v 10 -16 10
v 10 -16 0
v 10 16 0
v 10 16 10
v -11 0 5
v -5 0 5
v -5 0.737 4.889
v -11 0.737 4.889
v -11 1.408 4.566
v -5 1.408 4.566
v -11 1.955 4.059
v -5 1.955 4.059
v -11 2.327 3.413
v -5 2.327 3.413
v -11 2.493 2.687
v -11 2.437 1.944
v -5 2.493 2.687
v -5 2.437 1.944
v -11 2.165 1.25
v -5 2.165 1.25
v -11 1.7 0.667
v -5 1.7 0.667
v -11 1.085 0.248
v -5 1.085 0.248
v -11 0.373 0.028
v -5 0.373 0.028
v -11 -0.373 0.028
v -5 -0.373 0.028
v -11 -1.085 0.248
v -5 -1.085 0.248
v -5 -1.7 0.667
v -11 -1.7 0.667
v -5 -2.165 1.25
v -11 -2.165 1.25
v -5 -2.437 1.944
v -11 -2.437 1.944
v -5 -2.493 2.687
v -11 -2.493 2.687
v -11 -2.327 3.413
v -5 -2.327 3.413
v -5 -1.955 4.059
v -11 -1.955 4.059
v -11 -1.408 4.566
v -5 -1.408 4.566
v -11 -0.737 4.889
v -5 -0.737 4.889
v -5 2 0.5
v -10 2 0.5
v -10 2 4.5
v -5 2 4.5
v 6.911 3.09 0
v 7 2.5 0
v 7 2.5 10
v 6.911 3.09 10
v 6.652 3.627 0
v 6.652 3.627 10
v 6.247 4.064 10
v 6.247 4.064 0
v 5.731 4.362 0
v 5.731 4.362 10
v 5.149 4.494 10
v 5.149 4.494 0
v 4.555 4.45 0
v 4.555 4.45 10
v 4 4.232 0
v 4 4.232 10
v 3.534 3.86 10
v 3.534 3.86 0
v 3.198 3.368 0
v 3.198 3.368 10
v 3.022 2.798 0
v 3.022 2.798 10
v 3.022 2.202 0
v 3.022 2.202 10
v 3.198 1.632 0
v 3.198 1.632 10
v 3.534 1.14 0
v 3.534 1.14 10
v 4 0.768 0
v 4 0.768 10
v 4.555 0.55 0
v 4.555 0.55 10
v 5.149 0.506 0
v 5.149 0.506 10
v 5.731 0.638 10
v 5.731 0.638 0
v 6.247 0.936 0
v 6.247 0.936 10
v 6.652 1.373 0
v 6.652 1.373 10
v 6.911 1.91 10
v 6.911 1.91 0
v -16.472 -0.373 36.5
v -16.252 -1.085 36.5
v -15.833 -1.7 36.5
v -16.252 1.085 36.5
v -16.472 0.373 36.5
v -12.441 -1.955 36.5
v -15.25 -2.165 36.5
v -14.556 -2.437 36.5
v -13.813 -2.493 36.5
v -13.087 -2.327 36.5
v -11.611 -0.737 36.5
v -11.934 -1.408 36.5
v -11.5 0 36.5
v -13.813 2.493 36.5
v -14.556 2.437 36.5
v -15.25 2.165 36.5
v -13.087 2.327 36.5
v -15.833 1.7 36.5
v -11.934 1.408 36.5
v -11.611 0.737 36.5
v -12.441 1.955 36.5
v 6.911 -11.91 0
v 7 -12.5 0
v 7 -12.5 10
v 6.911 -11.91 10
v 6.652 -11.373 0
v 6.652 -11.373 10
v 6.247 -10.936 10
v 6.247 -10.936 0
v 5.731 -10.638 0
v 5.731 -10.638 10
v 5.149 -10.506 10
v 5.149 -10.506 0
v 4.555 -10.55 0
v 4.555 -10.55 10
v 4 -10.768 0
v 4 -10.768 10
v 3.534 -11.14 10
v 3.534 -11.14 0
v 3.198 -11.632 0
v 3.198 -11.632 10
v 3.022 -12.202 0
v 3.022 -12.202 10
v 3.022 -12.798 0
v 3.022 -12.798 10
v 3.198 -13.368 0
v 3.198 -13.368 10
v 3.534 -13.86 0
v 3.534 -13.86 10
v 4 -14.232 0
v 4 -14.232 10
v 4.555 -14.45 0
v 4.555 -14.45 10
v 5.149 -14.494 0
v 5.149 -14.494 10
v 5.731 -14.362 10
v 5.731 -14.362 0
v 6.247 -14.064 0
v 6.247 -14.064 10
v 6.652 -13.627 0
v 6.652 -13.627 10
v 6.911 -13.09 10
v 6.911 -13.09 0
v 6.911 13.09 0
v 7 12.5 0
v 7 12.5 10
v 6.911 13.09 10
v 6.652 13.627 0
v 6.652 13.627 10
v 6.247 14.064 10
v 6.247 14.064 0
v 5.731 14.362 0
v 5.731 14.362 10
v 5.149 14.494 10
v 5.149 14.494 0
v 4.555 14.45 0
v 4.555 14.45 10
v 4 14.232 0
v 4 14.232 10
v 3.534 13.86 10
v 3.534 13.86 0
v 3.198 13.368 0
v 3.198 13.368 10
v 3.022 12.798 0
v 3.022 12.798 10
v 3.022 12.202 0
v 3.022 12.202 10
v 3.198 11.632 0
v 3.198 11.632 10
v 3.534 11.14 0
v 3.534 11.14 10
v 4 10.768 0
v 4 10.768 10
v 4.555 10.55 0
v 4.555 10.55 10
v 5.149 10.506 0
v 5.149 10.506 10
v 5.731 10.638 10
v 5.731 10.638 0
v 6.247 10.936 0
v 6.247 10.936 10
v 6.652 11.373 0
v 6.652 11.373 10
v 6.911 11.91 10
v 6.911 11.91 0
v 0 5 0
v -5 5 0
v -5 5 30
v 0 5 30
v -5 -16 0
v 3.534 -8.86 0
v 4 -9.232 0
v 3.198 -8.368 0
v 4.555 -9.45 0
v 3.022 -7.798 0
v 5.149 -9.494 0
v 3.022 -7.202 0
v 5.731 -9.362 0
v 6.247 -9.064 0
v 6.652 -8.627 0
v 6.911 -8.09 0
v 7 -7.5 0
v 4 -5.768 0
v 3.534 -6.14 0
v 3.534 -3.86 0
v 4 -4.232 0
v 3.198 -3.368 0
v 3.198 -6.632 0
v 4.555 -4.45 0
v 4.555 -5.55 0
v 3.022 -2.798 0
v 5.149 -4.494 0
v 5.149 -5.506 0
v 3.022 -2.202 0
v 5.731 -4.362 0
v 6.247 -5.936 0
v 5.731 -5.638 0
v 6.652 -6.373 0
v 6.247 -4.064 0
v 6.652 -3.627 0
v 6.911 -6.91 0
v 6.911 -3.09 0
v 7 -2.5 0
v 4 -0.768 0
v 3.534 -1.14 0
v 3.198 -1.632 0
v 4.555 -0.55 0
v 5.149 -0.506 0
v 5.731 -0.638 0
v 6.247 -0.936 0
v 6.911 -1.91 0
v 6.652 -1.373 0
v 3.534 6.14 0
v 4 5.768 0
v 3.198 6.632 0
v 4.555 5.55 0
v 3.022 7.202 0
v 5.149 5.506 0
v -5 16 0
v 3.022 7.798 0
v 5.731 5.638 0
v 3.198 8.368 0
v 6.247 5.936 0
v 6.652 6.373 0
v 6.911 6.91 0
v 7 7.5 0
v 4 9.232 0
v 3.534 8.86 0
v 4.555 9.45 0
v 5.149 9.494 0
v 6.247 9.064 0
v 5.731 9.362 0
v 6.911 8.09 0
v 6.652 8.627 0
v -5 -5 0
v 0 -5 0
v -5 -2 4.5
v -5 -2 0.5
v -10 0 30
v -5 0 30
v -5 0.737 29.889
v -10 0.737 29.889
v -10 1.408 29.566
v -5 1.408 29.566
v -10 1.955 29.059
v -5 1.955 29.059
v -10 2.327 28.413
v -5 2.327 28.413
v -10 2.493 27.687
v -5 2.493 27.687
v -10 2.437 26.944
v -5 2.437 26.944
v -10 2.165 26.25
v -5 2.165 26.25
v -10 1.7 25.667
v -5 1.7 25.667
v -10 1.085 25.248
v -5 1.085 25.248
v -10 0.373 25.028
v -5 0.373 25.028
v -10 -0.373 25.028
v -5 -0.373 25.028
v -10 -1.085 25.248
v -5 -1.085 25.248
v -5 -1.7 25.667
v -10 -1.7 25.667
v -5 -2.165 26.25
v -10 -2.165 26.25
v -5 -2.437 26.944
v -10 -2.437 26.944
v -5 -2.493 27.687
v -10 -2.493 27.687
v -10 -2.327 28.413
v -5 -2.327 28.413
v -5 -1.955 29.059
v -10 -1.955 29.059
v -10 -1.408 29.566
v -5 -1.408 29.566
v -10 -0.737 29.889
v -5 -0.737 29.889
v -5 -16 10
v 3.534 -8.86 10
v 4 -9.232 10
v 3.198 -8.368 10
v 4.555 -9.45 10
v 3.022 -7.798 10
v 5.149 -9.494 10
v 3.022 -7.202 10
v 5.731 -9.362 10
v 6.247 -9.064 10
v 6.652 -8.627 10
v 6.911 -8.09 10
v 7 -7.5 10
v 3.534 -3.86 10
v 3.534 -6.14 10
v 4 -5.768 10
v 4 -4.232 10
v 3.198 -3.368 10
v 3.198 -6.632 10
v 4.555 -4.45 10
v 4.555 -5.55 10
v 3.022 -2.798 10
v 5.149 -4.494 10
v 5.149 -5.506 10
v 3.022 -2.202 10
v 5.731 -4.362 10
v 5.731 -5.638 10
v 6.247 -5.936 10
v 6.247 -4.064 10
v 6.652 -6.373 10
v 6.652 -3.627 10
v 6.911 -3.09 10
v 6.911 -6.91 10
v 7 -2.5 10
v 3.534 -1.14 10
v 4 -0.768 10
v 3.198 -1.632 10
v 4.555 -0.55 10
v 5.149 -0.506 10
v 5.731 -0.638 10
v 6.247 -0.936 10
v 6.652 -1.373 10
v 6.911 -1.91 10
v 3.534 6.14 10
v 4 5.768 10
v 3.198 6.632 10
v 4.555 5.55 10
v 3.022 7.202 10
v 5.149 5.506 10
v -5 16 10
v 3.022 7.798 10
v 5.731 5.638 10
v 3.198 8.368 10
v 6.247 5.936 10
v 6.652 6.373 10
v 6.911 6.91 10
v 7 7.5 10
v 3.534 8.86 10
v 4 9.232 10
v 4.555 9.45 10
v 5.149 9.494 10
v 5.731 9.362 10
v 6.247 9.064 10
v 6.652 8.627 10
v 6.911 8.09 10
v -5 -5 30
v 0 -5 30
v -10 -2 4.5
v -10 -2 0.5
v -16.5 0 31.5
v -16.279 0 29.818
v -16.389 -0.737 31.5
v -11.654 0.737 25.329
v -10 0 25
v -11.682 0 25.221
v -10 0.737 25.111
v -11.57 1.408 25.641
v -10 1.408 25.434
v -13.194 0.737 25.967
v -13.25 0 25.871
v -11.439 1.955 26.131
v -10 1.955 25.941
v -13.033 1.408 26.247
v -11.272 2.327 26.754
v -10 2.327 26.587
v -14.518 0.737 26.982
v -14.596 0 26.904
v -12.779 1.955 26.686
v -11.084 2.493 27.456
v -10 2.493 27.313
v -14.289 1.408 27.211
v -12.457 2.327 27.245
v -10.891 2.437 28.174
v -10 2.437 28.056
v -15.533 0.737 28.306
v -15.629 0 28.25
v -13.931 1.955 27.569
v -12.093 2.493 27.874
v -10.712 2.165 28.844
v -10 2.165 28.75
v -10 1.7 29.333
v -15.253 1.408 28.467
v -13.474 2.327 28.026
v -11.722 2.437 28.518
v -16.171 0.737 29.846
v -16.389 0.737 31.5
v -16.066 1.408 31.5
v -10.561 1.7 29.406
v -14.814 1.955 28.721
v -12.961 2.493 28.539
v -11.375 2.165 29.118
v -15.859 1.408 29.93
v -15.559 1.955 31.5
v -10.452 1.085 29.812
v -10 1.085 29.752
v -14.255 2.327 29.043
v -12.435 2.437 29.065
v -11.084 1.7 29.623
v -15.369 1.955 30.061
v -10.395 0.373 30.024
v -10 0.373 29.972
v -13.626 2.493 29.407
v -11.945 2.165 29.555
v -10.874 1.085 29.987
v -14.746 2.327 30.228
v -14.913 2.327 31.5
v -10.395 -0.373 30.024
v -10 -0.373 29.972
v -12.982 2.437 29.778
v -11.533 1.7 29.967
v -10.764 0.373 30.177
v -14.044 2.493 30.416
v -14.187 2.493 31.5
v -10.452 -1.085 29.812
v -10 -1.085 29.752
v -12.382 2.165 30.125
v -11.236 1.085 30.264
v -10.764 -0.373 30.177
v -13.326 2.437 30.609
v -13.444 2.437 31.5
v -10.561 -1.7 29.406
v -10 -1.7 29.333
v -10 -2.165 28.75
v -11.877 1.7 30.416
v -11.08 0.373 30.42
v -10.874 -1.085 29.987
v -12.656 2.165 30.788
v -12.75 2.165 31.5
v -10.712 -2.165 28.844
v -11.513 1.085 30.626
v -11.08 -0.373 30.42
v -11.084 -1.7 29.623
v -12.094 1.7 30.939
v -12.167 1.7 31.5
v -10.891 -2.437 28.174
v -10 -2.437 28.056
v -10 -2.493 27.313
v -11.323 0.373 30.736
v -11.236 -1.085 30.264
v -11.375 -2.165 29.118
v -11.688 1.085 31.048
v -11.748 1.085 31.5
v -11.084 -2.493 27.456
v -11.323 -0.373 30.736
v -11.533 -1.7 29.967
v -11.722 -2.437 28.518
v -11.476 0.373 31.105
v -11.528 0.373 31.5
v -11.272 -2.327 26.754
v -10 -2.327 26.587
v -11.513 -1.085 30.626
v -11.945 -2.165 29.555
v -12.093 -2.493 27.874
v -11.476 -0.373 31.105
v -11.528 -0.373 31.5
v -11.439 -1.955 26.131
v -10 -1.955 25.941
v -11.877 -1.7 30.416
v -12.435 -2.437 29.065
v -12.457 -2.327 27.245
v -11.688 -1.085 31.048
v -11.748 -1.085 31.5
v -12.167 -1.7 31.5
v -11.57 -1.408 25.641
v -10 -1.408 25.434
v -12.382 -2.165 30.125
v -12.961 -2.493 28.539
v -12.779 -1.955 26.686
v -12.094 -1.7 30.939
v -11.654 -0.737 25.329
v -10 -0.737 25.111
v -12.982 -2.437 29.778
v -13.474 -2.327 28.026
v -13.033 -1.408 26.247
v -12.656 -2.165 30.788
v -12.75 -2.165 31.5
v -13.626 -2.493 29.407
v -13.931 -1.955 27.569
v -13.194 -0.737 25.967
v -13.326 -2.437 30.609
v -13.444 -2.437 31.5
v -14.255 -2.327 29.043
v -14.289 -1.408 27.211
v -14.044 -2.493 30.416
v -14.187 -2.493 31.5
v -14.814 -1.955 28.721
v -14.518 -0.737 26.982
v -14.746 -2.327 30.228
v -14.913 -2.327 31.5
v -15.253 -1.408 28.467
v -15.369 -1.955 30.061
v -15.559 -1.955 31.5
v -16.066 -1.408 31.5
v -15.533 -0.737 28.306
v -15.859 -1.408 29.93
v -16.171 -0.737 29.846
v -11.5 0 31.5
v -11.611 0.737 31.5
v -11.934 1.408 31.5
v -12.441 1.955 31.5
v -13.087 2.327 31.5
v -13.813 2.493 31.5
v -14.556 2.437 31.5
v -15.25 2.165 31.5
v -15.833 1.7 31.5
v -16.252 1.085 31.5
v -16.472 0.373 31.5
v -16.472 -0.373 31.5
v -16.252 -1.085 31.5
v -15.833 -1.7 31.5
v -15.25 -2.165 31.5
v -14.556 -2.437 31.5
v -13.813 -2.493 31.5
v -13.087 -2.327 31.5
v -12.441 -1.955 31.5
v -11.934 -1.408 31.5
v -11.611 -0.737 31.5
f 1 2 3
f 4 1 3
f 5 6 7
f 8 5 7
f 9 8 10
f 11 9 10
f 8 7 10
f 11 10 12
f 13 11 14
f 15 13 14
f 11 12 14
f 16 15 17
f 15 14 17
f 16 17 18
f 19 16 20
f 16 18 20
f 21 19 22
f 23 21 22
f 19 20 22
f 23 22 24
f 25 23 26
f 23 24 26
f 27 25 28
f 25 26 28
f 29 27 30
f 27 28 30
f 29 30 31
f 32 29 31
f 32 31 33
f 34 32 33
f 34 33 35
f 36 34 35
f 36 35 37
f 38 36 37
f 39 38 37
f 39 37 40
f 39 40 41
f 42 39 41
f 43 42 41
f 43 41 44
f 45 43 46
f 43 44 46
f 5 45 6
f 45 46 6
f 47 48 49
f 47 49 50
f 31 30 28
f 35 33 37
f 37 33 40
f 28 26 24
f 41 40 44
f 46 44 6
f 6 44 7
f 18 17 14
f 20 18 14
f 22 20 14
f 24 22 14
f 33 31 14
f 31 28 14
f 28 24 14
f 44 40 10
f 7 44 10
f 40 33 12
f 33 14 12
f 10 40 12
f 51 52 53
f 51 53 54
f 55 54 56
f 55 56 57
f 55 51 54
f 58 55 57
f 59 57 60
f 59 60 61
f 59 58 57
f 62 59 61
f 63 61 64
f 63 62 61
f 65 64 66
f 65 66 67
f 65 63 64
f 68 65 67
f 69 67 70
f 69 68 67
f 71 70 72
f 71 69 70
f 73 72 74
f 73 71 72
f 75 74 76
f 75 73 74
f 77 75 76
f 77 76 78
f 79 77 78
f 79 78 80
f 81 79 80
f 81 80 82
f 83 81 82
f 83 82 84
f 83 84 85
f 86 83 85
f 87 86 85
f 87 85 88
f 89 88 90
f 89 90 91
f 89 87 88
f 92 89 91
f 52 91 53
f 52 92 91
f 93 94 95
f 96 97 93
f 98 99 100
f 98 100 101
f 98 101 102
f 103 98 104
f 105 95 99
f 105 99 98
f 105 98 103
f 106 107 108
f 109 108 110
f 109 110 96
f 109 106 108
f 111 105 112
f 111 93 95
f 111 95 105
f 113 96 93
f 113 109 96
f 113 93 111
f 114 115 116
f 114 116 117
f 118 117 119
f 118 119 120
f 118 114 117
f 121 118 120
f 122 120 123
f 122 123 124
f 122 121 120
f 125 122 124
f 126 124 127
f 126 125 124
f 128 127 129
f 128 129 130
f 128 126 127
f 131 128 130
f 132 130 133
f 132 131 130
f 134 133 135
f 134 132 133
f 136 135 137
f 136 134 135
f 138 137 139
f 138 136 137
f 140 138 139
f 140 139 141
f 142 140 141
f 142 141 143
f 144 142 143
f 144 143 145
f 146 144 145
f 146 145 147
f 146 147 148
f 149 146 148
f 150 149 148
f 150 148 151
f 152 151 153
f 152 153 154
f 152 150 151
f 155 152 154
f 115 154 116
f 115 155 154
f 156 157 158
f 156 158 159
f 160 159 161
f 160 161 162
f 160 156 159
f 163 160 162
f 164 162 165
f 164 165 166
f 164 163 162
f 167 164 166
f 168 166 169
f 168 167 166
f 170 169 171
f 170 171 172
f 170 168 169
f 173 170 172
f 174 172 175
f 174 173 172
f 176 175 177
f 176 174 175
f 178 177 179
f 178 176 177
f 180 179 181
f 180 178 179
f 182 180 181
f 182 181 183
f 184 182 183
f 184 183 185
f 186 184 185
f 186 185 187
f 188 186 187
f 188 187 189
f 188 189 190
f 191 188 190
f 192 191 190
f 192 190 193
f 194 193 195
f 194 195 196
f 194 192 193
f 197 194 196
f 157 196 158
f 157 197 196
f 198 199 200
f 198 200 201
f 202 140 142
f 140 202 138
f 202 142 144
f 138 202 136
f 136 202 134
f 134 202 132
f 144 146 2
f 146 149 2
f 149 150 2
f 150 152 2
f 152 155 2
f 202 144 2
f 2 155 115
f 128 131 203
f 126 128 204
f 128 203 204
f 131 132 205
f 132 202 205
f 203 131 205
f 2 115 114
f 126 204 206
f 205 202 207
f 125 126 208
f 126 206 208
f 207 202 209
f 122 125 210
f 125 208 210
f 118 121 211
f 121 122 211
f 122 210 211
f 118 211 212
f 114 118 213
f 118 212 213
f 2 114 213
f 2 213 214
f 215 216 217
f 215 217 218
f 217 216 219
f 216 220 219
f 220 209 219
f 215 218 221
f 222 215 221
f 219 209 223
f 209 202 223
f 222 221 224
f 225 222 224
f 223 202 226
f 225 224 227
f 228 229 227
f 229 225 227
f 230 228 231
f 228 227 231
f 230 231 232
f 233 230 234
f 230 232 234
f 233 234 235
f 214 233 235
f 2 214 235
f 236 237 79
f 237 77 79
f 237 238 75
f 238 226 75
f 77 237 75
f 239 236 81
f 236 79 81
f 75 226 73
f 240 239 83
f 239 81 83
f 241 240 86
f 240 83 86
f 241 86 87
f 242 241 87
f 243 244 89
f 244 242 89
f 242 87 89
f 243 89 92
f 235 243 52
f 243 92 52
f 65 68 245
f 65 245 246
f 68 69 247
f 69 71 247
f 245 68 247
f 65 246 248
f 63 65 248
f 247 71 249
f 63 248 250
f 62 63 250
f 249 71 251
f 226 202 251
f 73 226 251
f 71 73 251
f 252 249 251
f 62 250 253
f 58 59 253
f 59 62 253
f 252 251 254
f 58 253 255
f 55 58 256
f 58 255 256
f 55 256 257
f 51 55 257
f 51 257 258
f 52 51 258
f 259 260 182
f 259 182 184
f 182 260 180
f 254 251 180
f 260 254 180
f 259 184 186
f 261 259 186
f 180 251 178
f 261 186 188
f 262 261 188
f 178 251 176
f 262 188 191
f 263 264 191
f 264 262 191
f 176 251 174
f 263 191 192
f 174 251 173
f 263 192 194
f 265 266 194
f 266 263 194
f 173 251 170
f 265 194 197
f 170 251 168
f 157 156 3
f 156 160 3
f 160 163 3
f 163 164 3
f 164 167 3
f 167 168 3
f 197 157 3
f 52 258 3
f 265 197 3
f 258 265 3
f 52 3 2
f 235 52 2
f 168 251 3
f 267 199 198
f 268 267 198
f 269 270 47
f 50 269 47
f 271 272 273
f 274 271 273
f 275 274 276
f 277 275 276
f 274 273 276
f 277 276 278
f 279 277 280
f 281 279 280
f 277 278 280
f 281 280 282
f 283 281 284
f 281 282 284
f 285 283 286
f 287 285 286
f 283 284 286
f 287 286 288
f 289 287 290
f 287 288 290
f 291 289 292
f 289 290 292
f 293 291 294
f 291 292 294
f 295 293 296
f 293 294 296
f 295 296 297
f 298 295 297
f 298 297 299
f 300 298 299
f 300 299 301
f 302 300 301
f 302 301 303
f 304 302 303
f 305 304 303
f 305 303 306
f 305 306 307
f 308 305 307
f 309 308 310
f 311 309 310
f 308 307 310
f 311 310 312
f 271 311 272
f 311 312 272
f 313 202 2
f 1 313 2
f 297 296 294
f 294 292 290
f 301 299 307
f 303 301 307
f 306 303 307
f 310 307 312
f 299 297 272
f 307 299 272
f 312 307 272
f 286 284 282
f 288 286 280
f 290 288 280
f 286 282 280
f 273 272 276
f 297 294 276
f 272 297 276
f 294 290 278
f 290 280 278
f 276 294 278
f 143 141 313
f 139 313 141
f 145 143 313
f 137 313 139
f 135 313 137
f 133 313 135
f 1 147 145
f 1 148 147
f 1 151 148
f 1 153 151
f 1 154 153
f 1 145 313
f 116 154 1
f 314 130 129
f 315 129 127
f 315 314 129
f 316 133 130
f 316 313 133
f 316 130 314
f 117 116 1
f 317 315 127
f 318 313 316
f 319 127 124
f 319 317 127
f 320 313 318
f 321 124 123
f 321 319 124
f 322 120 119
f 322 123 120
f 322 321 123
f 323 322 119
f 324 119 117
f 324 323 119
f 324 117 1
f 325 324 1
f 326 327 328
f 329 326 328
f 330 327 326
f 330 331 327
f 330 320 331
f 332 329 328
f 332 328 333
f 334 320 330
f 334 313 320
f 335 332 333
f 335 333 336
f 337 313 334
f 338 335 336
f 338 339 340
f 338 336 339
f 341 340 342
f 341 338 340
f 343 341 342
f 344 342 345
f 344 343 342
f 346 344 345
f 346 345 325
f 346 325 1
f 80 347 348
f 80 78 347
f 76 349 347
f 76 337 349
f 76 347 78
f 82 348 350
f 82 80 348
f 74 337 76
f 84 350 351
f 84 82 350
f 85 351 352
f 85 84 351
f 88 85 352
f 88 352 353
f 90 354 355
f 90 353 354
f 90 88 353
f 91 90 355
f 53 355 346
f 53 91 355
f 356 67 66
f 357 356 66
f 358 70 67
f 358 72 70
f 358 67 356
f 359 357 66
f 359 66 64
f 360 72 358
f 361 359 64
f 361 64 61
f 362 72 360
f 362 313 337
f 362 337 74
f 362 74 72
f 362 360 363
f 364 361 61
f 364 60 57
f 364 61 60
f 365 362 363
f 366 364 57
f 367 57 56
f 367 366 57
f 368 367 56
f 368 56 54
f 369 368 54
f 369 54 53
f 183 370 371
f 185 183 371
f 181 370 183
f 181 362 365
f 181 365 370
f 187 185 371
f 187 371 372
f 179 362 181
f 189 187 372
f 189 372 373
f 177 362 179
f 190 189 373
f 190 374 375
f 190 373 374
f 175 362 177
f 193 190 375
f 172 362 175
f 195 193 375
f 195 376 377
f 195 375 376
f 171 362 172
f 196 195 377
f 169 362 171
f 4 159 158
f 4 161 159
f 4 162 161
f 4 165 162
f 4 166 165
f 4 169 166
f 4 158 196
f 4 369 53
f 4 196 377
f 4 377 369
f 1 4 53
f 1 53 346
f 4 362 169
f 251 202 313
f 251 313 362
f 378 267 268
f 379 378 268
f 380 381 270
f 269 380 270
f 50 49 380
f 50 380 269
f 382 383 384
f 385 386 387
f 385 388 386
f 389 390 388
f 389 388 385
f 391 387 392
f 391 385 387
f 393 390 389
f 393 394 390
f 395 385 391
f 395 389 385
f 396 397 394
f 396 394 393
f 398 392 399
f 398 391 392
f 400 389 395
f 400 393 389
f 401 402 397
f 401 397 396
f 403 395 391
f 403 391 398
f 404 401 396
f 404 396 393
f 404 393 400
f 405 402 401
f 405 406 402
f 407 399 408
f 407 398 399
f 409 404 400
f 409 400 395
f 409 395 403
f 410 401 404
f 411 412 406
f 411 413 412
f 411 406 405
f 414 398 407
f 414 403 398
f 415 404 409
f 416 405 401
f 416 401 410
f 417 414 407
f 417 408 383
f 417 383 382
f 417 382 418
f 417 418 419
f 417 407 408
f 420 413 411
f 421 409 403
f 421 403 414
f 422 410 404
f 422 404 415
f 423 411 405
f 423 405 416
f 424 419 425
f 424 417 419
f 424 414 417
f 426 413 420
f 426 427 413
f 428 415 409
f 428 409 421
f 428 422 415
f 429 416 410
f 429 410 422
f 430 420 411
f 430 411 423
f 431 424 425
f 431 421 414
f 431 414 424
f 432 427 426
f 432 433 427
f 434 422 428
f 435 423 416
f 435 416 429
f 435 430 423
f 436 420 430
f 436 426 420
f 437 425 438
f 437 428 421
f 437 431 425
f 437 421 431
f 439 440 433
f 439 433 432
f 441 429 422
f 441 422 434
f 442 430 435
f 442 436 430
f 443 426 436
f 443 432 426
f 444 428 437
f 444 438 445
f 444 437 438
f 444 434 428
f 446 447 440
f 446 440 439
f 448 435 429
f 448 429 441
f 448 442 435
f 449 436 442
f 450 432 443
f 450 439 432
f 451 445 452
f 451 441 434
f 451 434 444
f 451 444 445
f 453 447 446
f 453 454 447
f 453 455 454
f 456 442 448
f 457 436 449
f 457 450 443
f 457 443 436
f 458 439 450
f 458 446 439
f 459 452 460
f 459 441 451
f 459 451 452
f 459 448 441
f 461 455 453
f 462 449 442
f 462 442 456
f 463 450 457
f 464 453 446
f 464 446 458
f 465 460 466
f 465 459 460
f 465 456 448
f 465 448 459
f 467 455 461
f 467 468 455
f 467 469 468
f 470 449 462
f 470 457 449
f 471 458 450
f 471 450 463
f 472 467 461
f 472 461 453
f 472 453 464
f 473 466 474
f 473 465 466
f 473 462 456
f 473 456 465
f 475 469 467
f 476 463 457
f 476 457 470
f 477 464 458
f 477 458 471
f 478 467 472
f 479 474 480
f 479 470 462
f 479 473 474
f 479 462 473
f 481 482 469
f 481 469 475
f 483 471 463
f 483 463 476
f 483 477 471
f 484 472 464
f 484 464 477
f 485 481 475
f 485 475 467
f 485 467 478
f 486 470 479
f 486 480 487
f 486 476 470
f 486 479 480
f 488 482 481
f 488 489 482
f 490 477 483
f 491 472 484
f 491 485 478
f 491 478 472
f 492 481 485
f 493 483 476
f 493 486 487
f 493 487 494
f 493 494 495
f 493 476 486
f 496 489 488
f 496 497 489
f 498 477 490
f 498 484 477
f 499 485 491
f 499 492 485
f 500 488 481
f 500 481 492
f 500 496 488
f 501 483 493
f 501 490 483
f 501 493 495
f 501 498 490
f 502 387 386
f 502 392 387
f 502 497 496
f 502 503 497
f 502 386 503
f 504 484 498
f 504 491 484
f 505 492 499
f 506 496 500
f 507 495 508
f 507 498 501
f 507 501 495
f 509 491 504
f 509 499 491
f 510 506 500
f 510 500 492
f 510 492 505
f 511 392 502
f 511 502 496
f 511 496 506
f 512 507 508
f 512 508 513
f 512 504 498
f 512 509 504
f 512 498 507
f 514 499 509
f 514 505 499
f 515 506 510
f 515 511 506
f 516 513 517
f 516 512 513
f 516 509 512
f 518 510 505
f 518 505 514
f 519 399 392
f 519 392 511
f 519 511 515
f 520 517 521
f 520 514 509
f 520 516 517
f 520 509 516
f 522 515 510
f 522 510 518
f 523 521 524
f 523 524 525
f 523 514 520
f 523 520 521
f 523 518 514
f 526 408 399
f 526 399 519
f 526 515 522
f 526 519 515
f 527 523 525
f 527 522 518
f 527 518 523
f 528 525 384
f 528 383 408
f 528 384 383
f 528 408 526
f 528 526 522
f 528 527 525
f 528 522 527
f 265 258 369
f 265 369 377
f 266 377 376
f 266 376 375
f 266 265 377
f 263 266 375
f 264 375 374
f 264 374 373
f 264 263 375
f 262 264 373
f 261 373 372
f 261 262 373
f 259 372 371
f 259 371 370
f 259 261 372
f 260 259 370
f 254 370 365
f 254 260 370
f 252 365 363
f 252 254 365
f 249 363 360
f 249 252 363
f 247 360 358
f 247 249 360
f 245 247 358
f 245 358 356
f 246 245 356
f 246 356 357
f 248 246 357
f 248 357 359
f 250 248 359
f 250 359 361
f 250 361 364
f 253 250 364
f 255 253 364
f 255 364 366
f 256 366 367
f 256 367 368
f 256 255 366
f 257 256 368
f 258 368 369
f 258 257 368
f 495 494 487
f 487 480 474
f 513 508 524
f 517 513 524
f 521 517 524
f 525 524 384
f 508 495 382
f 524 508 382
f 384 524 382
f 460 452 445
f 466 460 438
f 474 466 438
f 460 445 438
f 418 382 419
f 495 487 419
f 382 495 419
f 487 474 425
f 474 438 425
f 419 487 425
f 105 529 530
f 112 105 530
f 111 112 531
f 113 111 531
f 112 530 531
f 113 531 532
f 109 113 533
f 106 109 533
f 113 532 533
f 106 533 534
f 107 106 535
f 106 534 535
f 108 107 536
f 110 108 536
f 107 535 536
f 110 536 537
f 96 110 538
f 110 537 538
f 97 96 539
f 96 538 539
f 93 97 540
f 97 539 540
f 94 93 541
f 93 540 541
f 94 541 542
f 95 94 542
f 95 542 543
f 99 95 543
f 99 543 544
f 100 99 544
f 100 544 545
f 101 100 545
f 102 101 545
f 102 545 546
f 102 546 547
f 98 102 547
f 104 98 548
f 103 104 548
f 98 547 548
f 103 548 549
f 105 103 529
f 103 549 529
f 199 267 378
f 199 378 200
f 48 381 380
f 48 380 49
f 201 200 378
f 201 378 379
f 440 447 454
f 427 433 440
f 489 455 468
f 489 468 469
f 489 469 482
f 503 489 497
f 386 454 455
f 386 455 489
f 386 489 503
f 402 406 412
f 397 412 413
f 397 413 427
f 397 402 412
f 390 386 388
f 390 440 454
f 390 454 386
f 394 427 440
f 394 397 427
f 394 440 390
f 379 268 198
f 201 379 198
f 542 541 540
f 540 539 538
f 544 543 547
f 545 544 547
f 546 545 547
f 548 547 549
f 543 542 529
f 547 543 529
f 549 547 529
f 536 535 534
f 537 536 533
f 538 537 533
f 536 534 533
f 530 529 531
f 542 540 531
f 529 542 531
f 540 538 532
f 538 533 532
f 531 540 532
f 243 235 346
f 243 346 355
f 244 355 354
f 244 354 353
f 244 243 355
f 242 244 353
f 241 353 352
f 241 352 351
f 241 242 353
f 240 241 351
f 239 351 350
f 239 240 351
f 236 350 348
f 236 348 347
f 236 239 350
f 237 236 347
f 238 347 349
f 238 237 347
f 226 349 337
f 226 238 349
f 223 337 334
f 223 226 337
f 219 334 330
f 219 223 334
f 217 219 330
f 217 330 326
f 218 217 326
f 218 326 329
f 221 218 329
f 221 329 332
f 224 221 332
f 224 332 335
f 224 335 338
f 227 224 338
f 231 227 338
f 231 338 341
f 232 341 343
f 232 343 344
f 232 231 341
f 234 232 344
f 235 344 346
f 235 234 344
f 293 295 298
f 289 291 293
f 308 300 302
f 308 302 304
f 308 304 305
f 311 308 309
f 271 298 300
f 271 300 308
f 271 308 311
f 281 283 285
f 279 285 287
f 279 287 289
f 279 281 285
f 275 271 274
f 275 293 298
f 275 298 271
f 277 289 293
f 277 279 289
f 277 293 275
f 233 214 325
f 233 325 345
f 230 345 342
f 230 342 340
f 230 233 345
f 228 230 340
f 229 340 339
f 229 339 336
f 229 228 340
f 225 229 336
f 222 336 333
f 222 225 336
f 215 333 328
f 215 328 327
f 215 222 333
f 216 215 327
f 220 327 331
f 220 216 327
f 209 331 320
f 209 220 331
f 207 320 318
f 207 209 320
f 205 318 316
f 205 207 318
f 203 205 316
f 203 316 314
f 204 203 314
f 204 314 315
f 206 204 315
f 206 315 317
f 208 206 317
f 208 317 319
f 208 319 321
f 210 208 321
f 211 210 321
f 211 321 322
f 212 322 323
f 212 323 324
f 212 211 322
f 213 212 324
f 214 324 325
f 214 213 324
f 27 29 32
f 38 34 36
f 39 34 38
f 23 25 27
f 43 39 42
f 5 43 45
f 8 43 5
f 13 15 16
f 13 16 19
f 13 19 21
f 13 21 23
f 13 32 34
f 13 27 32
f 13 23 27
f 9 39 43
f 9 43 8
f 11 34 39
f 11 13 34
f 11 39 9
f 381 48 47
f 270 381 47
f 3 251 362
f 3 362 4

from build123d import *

# Parameters (mm, degrees)
CYLINDER002_R           = 2.5
CYLINDER002_DEPTH       = 6
CYLINDER002_PITCH_ANGLE = -90
BOX001_W                = 5
BOX001_H                = 10
BOX001_DEPTH            = 30
CYLINDER003_R           = 2.5
CYLINDER003_DEPTH       = 5
CYLINDER003_PITCH_ANGLE = -90
TORUS_R                 = 2.5
TORUS_ANGLE             = 90
CYLINDER004_R           = 2.5
CYLINDER004_DEPTH       = 5
BOX002_W                = 5
BOX002_H                = 4
BOX002_DEPTH            = 4
CYLINDER_R              = 2
CYLINDER_DEPTH          = 10
ARRAY_Y_COUNT           = 6
ARRAY_Y_PITCH           = 5
BOX_W                   = 15
BOX_H                   = 32
BOX_DEPTH               = 10


with BuildPart() as cylinder002:
    # Cylinder002 → Cylinder002 (new body)
    with BuildSketch(Plane.XY):
        Circle(CYLINDER002_R)
    extrude(amount=CYLINDER002_DEPTH)


with BuildPart() as cylinder002_1:
    # Cylinder002 pitch: moved
    add(cylinder002.part.rotate(Axis((0, 0, 0), (0, 1, 0)), CYLINDER002_PITCH_ANGLE))


with BuildPart() as cylinder002_2:
    # Cylinder002 placement: moved
    add(cylinder002_1.part.moved(Location((-5, 0, 2.5))))


with BuildPart() as cube001:
    # Box001 → Box001 (new body)
    with BuildSketch(Plane(origin=(-5, -5, 0), x_dir=(1, 0, 0), z_dir=(0, 0, 1))):
        with Locations((2.5, 5)):
            Rectangle(BOX001_W, BOX001_H)
    extrude(amount=BOX001_DEPTH)


with BuildPart() as cylinder003:
    # Cylinder003 → Cylinder003 (new body)
    with BuildSketch(Plane.XY):
        Circle(CYLINDER003_R)
    extrude(amount=CYLINDER003_DEPTH)


with BuildPart() as cylinder003_1:
    # Cylinder003 pitch: moved
    add(cylinder003.part.rotate(Axis((0, 0, 0), (0, 1, 0)), CYLINDER003_PITCH_ANGLE))


with BuildPart() as cylinder003_2:
    # Cylinder003 placement: moved
    add(cylinder003_1.part.moved(Location((-5, 0, 27.5))))


with BuildPart() as torus:
    # Torus → Torus (revolve)
    with BuildSketch(Plane(origin=(-10, 0, 31.5), x_dir=(0, 0, -1), z_dir=(1, 0, 0))):
        with Locations((4, 0)):
            Circle(TORUS_R)
    revolve(axis=Axis((-10, 0, 31.5), (0, 1, 0)), revolution_arc=TORUS_ANGLE)


with BuildPart() as cylinder004:
    # Cylinder004 → Cylinder004 (new body)
    with BuildSketch(Plane(origin=(-14, 0, 31.5), x_dir=(1, 0, 0), z_dir=(0, 0, 1))):
        Circle(CYLINDER004_R)
    extrude(amount=CYLINDER004_DEPTH)


with BuildPart() as cube002:
    # Box002 → Box002 (new body)
    with BuildSketch(Plane(origin=(-10, -2, 0.5), x_dir=(1, 0, 0), z_dir=(0, 0, 1))):
        with Locations((2.5, 2)):
            Rectangle(BOX002_W, BOX002_H)
    extrude(amount=BOX002_DEPTH)


with BuildPart() as array:
    # Cylinder → Cylinder (new body)
    with BuildSketch(Plane(origin=(5, -12.5, 0), x_dir=(1, 0, 0), z_dir=(0, 0, 1))):
        Circle(CYLINDER_R)
    extrude(amount=CYLINDER_DEPTH)

    # Array Y: Array ×6


with BuildPart() as array_1:
    add(array.part)
    with Locations(*[(0, i * ARRAY_Y_PITCH, 0) for i in range(1, ARRAY_Y_COUNT)]):
        add(array.part)


with BuildPart() as cut:
    # Box → Box (new body)
    with BuildSketch(Plane(origin=(-5, -16, 0), x_dir=(1, 0, 0), z_dir=(0, 0, 1))):
        with Locations((7.5, 16)):
            Rectangle(BOX_W, BOX_H)
    extrude(amount=BOX_DEPTH)

    # Cut: cut Array
    add(array_1.part, mode=Mode.SUBTRACT)


solid = Compound([cylinder002_2.part, cube001.part, cylinder003_2.part, torus.part, cylinder004.part, cube002.part, cut.part])
